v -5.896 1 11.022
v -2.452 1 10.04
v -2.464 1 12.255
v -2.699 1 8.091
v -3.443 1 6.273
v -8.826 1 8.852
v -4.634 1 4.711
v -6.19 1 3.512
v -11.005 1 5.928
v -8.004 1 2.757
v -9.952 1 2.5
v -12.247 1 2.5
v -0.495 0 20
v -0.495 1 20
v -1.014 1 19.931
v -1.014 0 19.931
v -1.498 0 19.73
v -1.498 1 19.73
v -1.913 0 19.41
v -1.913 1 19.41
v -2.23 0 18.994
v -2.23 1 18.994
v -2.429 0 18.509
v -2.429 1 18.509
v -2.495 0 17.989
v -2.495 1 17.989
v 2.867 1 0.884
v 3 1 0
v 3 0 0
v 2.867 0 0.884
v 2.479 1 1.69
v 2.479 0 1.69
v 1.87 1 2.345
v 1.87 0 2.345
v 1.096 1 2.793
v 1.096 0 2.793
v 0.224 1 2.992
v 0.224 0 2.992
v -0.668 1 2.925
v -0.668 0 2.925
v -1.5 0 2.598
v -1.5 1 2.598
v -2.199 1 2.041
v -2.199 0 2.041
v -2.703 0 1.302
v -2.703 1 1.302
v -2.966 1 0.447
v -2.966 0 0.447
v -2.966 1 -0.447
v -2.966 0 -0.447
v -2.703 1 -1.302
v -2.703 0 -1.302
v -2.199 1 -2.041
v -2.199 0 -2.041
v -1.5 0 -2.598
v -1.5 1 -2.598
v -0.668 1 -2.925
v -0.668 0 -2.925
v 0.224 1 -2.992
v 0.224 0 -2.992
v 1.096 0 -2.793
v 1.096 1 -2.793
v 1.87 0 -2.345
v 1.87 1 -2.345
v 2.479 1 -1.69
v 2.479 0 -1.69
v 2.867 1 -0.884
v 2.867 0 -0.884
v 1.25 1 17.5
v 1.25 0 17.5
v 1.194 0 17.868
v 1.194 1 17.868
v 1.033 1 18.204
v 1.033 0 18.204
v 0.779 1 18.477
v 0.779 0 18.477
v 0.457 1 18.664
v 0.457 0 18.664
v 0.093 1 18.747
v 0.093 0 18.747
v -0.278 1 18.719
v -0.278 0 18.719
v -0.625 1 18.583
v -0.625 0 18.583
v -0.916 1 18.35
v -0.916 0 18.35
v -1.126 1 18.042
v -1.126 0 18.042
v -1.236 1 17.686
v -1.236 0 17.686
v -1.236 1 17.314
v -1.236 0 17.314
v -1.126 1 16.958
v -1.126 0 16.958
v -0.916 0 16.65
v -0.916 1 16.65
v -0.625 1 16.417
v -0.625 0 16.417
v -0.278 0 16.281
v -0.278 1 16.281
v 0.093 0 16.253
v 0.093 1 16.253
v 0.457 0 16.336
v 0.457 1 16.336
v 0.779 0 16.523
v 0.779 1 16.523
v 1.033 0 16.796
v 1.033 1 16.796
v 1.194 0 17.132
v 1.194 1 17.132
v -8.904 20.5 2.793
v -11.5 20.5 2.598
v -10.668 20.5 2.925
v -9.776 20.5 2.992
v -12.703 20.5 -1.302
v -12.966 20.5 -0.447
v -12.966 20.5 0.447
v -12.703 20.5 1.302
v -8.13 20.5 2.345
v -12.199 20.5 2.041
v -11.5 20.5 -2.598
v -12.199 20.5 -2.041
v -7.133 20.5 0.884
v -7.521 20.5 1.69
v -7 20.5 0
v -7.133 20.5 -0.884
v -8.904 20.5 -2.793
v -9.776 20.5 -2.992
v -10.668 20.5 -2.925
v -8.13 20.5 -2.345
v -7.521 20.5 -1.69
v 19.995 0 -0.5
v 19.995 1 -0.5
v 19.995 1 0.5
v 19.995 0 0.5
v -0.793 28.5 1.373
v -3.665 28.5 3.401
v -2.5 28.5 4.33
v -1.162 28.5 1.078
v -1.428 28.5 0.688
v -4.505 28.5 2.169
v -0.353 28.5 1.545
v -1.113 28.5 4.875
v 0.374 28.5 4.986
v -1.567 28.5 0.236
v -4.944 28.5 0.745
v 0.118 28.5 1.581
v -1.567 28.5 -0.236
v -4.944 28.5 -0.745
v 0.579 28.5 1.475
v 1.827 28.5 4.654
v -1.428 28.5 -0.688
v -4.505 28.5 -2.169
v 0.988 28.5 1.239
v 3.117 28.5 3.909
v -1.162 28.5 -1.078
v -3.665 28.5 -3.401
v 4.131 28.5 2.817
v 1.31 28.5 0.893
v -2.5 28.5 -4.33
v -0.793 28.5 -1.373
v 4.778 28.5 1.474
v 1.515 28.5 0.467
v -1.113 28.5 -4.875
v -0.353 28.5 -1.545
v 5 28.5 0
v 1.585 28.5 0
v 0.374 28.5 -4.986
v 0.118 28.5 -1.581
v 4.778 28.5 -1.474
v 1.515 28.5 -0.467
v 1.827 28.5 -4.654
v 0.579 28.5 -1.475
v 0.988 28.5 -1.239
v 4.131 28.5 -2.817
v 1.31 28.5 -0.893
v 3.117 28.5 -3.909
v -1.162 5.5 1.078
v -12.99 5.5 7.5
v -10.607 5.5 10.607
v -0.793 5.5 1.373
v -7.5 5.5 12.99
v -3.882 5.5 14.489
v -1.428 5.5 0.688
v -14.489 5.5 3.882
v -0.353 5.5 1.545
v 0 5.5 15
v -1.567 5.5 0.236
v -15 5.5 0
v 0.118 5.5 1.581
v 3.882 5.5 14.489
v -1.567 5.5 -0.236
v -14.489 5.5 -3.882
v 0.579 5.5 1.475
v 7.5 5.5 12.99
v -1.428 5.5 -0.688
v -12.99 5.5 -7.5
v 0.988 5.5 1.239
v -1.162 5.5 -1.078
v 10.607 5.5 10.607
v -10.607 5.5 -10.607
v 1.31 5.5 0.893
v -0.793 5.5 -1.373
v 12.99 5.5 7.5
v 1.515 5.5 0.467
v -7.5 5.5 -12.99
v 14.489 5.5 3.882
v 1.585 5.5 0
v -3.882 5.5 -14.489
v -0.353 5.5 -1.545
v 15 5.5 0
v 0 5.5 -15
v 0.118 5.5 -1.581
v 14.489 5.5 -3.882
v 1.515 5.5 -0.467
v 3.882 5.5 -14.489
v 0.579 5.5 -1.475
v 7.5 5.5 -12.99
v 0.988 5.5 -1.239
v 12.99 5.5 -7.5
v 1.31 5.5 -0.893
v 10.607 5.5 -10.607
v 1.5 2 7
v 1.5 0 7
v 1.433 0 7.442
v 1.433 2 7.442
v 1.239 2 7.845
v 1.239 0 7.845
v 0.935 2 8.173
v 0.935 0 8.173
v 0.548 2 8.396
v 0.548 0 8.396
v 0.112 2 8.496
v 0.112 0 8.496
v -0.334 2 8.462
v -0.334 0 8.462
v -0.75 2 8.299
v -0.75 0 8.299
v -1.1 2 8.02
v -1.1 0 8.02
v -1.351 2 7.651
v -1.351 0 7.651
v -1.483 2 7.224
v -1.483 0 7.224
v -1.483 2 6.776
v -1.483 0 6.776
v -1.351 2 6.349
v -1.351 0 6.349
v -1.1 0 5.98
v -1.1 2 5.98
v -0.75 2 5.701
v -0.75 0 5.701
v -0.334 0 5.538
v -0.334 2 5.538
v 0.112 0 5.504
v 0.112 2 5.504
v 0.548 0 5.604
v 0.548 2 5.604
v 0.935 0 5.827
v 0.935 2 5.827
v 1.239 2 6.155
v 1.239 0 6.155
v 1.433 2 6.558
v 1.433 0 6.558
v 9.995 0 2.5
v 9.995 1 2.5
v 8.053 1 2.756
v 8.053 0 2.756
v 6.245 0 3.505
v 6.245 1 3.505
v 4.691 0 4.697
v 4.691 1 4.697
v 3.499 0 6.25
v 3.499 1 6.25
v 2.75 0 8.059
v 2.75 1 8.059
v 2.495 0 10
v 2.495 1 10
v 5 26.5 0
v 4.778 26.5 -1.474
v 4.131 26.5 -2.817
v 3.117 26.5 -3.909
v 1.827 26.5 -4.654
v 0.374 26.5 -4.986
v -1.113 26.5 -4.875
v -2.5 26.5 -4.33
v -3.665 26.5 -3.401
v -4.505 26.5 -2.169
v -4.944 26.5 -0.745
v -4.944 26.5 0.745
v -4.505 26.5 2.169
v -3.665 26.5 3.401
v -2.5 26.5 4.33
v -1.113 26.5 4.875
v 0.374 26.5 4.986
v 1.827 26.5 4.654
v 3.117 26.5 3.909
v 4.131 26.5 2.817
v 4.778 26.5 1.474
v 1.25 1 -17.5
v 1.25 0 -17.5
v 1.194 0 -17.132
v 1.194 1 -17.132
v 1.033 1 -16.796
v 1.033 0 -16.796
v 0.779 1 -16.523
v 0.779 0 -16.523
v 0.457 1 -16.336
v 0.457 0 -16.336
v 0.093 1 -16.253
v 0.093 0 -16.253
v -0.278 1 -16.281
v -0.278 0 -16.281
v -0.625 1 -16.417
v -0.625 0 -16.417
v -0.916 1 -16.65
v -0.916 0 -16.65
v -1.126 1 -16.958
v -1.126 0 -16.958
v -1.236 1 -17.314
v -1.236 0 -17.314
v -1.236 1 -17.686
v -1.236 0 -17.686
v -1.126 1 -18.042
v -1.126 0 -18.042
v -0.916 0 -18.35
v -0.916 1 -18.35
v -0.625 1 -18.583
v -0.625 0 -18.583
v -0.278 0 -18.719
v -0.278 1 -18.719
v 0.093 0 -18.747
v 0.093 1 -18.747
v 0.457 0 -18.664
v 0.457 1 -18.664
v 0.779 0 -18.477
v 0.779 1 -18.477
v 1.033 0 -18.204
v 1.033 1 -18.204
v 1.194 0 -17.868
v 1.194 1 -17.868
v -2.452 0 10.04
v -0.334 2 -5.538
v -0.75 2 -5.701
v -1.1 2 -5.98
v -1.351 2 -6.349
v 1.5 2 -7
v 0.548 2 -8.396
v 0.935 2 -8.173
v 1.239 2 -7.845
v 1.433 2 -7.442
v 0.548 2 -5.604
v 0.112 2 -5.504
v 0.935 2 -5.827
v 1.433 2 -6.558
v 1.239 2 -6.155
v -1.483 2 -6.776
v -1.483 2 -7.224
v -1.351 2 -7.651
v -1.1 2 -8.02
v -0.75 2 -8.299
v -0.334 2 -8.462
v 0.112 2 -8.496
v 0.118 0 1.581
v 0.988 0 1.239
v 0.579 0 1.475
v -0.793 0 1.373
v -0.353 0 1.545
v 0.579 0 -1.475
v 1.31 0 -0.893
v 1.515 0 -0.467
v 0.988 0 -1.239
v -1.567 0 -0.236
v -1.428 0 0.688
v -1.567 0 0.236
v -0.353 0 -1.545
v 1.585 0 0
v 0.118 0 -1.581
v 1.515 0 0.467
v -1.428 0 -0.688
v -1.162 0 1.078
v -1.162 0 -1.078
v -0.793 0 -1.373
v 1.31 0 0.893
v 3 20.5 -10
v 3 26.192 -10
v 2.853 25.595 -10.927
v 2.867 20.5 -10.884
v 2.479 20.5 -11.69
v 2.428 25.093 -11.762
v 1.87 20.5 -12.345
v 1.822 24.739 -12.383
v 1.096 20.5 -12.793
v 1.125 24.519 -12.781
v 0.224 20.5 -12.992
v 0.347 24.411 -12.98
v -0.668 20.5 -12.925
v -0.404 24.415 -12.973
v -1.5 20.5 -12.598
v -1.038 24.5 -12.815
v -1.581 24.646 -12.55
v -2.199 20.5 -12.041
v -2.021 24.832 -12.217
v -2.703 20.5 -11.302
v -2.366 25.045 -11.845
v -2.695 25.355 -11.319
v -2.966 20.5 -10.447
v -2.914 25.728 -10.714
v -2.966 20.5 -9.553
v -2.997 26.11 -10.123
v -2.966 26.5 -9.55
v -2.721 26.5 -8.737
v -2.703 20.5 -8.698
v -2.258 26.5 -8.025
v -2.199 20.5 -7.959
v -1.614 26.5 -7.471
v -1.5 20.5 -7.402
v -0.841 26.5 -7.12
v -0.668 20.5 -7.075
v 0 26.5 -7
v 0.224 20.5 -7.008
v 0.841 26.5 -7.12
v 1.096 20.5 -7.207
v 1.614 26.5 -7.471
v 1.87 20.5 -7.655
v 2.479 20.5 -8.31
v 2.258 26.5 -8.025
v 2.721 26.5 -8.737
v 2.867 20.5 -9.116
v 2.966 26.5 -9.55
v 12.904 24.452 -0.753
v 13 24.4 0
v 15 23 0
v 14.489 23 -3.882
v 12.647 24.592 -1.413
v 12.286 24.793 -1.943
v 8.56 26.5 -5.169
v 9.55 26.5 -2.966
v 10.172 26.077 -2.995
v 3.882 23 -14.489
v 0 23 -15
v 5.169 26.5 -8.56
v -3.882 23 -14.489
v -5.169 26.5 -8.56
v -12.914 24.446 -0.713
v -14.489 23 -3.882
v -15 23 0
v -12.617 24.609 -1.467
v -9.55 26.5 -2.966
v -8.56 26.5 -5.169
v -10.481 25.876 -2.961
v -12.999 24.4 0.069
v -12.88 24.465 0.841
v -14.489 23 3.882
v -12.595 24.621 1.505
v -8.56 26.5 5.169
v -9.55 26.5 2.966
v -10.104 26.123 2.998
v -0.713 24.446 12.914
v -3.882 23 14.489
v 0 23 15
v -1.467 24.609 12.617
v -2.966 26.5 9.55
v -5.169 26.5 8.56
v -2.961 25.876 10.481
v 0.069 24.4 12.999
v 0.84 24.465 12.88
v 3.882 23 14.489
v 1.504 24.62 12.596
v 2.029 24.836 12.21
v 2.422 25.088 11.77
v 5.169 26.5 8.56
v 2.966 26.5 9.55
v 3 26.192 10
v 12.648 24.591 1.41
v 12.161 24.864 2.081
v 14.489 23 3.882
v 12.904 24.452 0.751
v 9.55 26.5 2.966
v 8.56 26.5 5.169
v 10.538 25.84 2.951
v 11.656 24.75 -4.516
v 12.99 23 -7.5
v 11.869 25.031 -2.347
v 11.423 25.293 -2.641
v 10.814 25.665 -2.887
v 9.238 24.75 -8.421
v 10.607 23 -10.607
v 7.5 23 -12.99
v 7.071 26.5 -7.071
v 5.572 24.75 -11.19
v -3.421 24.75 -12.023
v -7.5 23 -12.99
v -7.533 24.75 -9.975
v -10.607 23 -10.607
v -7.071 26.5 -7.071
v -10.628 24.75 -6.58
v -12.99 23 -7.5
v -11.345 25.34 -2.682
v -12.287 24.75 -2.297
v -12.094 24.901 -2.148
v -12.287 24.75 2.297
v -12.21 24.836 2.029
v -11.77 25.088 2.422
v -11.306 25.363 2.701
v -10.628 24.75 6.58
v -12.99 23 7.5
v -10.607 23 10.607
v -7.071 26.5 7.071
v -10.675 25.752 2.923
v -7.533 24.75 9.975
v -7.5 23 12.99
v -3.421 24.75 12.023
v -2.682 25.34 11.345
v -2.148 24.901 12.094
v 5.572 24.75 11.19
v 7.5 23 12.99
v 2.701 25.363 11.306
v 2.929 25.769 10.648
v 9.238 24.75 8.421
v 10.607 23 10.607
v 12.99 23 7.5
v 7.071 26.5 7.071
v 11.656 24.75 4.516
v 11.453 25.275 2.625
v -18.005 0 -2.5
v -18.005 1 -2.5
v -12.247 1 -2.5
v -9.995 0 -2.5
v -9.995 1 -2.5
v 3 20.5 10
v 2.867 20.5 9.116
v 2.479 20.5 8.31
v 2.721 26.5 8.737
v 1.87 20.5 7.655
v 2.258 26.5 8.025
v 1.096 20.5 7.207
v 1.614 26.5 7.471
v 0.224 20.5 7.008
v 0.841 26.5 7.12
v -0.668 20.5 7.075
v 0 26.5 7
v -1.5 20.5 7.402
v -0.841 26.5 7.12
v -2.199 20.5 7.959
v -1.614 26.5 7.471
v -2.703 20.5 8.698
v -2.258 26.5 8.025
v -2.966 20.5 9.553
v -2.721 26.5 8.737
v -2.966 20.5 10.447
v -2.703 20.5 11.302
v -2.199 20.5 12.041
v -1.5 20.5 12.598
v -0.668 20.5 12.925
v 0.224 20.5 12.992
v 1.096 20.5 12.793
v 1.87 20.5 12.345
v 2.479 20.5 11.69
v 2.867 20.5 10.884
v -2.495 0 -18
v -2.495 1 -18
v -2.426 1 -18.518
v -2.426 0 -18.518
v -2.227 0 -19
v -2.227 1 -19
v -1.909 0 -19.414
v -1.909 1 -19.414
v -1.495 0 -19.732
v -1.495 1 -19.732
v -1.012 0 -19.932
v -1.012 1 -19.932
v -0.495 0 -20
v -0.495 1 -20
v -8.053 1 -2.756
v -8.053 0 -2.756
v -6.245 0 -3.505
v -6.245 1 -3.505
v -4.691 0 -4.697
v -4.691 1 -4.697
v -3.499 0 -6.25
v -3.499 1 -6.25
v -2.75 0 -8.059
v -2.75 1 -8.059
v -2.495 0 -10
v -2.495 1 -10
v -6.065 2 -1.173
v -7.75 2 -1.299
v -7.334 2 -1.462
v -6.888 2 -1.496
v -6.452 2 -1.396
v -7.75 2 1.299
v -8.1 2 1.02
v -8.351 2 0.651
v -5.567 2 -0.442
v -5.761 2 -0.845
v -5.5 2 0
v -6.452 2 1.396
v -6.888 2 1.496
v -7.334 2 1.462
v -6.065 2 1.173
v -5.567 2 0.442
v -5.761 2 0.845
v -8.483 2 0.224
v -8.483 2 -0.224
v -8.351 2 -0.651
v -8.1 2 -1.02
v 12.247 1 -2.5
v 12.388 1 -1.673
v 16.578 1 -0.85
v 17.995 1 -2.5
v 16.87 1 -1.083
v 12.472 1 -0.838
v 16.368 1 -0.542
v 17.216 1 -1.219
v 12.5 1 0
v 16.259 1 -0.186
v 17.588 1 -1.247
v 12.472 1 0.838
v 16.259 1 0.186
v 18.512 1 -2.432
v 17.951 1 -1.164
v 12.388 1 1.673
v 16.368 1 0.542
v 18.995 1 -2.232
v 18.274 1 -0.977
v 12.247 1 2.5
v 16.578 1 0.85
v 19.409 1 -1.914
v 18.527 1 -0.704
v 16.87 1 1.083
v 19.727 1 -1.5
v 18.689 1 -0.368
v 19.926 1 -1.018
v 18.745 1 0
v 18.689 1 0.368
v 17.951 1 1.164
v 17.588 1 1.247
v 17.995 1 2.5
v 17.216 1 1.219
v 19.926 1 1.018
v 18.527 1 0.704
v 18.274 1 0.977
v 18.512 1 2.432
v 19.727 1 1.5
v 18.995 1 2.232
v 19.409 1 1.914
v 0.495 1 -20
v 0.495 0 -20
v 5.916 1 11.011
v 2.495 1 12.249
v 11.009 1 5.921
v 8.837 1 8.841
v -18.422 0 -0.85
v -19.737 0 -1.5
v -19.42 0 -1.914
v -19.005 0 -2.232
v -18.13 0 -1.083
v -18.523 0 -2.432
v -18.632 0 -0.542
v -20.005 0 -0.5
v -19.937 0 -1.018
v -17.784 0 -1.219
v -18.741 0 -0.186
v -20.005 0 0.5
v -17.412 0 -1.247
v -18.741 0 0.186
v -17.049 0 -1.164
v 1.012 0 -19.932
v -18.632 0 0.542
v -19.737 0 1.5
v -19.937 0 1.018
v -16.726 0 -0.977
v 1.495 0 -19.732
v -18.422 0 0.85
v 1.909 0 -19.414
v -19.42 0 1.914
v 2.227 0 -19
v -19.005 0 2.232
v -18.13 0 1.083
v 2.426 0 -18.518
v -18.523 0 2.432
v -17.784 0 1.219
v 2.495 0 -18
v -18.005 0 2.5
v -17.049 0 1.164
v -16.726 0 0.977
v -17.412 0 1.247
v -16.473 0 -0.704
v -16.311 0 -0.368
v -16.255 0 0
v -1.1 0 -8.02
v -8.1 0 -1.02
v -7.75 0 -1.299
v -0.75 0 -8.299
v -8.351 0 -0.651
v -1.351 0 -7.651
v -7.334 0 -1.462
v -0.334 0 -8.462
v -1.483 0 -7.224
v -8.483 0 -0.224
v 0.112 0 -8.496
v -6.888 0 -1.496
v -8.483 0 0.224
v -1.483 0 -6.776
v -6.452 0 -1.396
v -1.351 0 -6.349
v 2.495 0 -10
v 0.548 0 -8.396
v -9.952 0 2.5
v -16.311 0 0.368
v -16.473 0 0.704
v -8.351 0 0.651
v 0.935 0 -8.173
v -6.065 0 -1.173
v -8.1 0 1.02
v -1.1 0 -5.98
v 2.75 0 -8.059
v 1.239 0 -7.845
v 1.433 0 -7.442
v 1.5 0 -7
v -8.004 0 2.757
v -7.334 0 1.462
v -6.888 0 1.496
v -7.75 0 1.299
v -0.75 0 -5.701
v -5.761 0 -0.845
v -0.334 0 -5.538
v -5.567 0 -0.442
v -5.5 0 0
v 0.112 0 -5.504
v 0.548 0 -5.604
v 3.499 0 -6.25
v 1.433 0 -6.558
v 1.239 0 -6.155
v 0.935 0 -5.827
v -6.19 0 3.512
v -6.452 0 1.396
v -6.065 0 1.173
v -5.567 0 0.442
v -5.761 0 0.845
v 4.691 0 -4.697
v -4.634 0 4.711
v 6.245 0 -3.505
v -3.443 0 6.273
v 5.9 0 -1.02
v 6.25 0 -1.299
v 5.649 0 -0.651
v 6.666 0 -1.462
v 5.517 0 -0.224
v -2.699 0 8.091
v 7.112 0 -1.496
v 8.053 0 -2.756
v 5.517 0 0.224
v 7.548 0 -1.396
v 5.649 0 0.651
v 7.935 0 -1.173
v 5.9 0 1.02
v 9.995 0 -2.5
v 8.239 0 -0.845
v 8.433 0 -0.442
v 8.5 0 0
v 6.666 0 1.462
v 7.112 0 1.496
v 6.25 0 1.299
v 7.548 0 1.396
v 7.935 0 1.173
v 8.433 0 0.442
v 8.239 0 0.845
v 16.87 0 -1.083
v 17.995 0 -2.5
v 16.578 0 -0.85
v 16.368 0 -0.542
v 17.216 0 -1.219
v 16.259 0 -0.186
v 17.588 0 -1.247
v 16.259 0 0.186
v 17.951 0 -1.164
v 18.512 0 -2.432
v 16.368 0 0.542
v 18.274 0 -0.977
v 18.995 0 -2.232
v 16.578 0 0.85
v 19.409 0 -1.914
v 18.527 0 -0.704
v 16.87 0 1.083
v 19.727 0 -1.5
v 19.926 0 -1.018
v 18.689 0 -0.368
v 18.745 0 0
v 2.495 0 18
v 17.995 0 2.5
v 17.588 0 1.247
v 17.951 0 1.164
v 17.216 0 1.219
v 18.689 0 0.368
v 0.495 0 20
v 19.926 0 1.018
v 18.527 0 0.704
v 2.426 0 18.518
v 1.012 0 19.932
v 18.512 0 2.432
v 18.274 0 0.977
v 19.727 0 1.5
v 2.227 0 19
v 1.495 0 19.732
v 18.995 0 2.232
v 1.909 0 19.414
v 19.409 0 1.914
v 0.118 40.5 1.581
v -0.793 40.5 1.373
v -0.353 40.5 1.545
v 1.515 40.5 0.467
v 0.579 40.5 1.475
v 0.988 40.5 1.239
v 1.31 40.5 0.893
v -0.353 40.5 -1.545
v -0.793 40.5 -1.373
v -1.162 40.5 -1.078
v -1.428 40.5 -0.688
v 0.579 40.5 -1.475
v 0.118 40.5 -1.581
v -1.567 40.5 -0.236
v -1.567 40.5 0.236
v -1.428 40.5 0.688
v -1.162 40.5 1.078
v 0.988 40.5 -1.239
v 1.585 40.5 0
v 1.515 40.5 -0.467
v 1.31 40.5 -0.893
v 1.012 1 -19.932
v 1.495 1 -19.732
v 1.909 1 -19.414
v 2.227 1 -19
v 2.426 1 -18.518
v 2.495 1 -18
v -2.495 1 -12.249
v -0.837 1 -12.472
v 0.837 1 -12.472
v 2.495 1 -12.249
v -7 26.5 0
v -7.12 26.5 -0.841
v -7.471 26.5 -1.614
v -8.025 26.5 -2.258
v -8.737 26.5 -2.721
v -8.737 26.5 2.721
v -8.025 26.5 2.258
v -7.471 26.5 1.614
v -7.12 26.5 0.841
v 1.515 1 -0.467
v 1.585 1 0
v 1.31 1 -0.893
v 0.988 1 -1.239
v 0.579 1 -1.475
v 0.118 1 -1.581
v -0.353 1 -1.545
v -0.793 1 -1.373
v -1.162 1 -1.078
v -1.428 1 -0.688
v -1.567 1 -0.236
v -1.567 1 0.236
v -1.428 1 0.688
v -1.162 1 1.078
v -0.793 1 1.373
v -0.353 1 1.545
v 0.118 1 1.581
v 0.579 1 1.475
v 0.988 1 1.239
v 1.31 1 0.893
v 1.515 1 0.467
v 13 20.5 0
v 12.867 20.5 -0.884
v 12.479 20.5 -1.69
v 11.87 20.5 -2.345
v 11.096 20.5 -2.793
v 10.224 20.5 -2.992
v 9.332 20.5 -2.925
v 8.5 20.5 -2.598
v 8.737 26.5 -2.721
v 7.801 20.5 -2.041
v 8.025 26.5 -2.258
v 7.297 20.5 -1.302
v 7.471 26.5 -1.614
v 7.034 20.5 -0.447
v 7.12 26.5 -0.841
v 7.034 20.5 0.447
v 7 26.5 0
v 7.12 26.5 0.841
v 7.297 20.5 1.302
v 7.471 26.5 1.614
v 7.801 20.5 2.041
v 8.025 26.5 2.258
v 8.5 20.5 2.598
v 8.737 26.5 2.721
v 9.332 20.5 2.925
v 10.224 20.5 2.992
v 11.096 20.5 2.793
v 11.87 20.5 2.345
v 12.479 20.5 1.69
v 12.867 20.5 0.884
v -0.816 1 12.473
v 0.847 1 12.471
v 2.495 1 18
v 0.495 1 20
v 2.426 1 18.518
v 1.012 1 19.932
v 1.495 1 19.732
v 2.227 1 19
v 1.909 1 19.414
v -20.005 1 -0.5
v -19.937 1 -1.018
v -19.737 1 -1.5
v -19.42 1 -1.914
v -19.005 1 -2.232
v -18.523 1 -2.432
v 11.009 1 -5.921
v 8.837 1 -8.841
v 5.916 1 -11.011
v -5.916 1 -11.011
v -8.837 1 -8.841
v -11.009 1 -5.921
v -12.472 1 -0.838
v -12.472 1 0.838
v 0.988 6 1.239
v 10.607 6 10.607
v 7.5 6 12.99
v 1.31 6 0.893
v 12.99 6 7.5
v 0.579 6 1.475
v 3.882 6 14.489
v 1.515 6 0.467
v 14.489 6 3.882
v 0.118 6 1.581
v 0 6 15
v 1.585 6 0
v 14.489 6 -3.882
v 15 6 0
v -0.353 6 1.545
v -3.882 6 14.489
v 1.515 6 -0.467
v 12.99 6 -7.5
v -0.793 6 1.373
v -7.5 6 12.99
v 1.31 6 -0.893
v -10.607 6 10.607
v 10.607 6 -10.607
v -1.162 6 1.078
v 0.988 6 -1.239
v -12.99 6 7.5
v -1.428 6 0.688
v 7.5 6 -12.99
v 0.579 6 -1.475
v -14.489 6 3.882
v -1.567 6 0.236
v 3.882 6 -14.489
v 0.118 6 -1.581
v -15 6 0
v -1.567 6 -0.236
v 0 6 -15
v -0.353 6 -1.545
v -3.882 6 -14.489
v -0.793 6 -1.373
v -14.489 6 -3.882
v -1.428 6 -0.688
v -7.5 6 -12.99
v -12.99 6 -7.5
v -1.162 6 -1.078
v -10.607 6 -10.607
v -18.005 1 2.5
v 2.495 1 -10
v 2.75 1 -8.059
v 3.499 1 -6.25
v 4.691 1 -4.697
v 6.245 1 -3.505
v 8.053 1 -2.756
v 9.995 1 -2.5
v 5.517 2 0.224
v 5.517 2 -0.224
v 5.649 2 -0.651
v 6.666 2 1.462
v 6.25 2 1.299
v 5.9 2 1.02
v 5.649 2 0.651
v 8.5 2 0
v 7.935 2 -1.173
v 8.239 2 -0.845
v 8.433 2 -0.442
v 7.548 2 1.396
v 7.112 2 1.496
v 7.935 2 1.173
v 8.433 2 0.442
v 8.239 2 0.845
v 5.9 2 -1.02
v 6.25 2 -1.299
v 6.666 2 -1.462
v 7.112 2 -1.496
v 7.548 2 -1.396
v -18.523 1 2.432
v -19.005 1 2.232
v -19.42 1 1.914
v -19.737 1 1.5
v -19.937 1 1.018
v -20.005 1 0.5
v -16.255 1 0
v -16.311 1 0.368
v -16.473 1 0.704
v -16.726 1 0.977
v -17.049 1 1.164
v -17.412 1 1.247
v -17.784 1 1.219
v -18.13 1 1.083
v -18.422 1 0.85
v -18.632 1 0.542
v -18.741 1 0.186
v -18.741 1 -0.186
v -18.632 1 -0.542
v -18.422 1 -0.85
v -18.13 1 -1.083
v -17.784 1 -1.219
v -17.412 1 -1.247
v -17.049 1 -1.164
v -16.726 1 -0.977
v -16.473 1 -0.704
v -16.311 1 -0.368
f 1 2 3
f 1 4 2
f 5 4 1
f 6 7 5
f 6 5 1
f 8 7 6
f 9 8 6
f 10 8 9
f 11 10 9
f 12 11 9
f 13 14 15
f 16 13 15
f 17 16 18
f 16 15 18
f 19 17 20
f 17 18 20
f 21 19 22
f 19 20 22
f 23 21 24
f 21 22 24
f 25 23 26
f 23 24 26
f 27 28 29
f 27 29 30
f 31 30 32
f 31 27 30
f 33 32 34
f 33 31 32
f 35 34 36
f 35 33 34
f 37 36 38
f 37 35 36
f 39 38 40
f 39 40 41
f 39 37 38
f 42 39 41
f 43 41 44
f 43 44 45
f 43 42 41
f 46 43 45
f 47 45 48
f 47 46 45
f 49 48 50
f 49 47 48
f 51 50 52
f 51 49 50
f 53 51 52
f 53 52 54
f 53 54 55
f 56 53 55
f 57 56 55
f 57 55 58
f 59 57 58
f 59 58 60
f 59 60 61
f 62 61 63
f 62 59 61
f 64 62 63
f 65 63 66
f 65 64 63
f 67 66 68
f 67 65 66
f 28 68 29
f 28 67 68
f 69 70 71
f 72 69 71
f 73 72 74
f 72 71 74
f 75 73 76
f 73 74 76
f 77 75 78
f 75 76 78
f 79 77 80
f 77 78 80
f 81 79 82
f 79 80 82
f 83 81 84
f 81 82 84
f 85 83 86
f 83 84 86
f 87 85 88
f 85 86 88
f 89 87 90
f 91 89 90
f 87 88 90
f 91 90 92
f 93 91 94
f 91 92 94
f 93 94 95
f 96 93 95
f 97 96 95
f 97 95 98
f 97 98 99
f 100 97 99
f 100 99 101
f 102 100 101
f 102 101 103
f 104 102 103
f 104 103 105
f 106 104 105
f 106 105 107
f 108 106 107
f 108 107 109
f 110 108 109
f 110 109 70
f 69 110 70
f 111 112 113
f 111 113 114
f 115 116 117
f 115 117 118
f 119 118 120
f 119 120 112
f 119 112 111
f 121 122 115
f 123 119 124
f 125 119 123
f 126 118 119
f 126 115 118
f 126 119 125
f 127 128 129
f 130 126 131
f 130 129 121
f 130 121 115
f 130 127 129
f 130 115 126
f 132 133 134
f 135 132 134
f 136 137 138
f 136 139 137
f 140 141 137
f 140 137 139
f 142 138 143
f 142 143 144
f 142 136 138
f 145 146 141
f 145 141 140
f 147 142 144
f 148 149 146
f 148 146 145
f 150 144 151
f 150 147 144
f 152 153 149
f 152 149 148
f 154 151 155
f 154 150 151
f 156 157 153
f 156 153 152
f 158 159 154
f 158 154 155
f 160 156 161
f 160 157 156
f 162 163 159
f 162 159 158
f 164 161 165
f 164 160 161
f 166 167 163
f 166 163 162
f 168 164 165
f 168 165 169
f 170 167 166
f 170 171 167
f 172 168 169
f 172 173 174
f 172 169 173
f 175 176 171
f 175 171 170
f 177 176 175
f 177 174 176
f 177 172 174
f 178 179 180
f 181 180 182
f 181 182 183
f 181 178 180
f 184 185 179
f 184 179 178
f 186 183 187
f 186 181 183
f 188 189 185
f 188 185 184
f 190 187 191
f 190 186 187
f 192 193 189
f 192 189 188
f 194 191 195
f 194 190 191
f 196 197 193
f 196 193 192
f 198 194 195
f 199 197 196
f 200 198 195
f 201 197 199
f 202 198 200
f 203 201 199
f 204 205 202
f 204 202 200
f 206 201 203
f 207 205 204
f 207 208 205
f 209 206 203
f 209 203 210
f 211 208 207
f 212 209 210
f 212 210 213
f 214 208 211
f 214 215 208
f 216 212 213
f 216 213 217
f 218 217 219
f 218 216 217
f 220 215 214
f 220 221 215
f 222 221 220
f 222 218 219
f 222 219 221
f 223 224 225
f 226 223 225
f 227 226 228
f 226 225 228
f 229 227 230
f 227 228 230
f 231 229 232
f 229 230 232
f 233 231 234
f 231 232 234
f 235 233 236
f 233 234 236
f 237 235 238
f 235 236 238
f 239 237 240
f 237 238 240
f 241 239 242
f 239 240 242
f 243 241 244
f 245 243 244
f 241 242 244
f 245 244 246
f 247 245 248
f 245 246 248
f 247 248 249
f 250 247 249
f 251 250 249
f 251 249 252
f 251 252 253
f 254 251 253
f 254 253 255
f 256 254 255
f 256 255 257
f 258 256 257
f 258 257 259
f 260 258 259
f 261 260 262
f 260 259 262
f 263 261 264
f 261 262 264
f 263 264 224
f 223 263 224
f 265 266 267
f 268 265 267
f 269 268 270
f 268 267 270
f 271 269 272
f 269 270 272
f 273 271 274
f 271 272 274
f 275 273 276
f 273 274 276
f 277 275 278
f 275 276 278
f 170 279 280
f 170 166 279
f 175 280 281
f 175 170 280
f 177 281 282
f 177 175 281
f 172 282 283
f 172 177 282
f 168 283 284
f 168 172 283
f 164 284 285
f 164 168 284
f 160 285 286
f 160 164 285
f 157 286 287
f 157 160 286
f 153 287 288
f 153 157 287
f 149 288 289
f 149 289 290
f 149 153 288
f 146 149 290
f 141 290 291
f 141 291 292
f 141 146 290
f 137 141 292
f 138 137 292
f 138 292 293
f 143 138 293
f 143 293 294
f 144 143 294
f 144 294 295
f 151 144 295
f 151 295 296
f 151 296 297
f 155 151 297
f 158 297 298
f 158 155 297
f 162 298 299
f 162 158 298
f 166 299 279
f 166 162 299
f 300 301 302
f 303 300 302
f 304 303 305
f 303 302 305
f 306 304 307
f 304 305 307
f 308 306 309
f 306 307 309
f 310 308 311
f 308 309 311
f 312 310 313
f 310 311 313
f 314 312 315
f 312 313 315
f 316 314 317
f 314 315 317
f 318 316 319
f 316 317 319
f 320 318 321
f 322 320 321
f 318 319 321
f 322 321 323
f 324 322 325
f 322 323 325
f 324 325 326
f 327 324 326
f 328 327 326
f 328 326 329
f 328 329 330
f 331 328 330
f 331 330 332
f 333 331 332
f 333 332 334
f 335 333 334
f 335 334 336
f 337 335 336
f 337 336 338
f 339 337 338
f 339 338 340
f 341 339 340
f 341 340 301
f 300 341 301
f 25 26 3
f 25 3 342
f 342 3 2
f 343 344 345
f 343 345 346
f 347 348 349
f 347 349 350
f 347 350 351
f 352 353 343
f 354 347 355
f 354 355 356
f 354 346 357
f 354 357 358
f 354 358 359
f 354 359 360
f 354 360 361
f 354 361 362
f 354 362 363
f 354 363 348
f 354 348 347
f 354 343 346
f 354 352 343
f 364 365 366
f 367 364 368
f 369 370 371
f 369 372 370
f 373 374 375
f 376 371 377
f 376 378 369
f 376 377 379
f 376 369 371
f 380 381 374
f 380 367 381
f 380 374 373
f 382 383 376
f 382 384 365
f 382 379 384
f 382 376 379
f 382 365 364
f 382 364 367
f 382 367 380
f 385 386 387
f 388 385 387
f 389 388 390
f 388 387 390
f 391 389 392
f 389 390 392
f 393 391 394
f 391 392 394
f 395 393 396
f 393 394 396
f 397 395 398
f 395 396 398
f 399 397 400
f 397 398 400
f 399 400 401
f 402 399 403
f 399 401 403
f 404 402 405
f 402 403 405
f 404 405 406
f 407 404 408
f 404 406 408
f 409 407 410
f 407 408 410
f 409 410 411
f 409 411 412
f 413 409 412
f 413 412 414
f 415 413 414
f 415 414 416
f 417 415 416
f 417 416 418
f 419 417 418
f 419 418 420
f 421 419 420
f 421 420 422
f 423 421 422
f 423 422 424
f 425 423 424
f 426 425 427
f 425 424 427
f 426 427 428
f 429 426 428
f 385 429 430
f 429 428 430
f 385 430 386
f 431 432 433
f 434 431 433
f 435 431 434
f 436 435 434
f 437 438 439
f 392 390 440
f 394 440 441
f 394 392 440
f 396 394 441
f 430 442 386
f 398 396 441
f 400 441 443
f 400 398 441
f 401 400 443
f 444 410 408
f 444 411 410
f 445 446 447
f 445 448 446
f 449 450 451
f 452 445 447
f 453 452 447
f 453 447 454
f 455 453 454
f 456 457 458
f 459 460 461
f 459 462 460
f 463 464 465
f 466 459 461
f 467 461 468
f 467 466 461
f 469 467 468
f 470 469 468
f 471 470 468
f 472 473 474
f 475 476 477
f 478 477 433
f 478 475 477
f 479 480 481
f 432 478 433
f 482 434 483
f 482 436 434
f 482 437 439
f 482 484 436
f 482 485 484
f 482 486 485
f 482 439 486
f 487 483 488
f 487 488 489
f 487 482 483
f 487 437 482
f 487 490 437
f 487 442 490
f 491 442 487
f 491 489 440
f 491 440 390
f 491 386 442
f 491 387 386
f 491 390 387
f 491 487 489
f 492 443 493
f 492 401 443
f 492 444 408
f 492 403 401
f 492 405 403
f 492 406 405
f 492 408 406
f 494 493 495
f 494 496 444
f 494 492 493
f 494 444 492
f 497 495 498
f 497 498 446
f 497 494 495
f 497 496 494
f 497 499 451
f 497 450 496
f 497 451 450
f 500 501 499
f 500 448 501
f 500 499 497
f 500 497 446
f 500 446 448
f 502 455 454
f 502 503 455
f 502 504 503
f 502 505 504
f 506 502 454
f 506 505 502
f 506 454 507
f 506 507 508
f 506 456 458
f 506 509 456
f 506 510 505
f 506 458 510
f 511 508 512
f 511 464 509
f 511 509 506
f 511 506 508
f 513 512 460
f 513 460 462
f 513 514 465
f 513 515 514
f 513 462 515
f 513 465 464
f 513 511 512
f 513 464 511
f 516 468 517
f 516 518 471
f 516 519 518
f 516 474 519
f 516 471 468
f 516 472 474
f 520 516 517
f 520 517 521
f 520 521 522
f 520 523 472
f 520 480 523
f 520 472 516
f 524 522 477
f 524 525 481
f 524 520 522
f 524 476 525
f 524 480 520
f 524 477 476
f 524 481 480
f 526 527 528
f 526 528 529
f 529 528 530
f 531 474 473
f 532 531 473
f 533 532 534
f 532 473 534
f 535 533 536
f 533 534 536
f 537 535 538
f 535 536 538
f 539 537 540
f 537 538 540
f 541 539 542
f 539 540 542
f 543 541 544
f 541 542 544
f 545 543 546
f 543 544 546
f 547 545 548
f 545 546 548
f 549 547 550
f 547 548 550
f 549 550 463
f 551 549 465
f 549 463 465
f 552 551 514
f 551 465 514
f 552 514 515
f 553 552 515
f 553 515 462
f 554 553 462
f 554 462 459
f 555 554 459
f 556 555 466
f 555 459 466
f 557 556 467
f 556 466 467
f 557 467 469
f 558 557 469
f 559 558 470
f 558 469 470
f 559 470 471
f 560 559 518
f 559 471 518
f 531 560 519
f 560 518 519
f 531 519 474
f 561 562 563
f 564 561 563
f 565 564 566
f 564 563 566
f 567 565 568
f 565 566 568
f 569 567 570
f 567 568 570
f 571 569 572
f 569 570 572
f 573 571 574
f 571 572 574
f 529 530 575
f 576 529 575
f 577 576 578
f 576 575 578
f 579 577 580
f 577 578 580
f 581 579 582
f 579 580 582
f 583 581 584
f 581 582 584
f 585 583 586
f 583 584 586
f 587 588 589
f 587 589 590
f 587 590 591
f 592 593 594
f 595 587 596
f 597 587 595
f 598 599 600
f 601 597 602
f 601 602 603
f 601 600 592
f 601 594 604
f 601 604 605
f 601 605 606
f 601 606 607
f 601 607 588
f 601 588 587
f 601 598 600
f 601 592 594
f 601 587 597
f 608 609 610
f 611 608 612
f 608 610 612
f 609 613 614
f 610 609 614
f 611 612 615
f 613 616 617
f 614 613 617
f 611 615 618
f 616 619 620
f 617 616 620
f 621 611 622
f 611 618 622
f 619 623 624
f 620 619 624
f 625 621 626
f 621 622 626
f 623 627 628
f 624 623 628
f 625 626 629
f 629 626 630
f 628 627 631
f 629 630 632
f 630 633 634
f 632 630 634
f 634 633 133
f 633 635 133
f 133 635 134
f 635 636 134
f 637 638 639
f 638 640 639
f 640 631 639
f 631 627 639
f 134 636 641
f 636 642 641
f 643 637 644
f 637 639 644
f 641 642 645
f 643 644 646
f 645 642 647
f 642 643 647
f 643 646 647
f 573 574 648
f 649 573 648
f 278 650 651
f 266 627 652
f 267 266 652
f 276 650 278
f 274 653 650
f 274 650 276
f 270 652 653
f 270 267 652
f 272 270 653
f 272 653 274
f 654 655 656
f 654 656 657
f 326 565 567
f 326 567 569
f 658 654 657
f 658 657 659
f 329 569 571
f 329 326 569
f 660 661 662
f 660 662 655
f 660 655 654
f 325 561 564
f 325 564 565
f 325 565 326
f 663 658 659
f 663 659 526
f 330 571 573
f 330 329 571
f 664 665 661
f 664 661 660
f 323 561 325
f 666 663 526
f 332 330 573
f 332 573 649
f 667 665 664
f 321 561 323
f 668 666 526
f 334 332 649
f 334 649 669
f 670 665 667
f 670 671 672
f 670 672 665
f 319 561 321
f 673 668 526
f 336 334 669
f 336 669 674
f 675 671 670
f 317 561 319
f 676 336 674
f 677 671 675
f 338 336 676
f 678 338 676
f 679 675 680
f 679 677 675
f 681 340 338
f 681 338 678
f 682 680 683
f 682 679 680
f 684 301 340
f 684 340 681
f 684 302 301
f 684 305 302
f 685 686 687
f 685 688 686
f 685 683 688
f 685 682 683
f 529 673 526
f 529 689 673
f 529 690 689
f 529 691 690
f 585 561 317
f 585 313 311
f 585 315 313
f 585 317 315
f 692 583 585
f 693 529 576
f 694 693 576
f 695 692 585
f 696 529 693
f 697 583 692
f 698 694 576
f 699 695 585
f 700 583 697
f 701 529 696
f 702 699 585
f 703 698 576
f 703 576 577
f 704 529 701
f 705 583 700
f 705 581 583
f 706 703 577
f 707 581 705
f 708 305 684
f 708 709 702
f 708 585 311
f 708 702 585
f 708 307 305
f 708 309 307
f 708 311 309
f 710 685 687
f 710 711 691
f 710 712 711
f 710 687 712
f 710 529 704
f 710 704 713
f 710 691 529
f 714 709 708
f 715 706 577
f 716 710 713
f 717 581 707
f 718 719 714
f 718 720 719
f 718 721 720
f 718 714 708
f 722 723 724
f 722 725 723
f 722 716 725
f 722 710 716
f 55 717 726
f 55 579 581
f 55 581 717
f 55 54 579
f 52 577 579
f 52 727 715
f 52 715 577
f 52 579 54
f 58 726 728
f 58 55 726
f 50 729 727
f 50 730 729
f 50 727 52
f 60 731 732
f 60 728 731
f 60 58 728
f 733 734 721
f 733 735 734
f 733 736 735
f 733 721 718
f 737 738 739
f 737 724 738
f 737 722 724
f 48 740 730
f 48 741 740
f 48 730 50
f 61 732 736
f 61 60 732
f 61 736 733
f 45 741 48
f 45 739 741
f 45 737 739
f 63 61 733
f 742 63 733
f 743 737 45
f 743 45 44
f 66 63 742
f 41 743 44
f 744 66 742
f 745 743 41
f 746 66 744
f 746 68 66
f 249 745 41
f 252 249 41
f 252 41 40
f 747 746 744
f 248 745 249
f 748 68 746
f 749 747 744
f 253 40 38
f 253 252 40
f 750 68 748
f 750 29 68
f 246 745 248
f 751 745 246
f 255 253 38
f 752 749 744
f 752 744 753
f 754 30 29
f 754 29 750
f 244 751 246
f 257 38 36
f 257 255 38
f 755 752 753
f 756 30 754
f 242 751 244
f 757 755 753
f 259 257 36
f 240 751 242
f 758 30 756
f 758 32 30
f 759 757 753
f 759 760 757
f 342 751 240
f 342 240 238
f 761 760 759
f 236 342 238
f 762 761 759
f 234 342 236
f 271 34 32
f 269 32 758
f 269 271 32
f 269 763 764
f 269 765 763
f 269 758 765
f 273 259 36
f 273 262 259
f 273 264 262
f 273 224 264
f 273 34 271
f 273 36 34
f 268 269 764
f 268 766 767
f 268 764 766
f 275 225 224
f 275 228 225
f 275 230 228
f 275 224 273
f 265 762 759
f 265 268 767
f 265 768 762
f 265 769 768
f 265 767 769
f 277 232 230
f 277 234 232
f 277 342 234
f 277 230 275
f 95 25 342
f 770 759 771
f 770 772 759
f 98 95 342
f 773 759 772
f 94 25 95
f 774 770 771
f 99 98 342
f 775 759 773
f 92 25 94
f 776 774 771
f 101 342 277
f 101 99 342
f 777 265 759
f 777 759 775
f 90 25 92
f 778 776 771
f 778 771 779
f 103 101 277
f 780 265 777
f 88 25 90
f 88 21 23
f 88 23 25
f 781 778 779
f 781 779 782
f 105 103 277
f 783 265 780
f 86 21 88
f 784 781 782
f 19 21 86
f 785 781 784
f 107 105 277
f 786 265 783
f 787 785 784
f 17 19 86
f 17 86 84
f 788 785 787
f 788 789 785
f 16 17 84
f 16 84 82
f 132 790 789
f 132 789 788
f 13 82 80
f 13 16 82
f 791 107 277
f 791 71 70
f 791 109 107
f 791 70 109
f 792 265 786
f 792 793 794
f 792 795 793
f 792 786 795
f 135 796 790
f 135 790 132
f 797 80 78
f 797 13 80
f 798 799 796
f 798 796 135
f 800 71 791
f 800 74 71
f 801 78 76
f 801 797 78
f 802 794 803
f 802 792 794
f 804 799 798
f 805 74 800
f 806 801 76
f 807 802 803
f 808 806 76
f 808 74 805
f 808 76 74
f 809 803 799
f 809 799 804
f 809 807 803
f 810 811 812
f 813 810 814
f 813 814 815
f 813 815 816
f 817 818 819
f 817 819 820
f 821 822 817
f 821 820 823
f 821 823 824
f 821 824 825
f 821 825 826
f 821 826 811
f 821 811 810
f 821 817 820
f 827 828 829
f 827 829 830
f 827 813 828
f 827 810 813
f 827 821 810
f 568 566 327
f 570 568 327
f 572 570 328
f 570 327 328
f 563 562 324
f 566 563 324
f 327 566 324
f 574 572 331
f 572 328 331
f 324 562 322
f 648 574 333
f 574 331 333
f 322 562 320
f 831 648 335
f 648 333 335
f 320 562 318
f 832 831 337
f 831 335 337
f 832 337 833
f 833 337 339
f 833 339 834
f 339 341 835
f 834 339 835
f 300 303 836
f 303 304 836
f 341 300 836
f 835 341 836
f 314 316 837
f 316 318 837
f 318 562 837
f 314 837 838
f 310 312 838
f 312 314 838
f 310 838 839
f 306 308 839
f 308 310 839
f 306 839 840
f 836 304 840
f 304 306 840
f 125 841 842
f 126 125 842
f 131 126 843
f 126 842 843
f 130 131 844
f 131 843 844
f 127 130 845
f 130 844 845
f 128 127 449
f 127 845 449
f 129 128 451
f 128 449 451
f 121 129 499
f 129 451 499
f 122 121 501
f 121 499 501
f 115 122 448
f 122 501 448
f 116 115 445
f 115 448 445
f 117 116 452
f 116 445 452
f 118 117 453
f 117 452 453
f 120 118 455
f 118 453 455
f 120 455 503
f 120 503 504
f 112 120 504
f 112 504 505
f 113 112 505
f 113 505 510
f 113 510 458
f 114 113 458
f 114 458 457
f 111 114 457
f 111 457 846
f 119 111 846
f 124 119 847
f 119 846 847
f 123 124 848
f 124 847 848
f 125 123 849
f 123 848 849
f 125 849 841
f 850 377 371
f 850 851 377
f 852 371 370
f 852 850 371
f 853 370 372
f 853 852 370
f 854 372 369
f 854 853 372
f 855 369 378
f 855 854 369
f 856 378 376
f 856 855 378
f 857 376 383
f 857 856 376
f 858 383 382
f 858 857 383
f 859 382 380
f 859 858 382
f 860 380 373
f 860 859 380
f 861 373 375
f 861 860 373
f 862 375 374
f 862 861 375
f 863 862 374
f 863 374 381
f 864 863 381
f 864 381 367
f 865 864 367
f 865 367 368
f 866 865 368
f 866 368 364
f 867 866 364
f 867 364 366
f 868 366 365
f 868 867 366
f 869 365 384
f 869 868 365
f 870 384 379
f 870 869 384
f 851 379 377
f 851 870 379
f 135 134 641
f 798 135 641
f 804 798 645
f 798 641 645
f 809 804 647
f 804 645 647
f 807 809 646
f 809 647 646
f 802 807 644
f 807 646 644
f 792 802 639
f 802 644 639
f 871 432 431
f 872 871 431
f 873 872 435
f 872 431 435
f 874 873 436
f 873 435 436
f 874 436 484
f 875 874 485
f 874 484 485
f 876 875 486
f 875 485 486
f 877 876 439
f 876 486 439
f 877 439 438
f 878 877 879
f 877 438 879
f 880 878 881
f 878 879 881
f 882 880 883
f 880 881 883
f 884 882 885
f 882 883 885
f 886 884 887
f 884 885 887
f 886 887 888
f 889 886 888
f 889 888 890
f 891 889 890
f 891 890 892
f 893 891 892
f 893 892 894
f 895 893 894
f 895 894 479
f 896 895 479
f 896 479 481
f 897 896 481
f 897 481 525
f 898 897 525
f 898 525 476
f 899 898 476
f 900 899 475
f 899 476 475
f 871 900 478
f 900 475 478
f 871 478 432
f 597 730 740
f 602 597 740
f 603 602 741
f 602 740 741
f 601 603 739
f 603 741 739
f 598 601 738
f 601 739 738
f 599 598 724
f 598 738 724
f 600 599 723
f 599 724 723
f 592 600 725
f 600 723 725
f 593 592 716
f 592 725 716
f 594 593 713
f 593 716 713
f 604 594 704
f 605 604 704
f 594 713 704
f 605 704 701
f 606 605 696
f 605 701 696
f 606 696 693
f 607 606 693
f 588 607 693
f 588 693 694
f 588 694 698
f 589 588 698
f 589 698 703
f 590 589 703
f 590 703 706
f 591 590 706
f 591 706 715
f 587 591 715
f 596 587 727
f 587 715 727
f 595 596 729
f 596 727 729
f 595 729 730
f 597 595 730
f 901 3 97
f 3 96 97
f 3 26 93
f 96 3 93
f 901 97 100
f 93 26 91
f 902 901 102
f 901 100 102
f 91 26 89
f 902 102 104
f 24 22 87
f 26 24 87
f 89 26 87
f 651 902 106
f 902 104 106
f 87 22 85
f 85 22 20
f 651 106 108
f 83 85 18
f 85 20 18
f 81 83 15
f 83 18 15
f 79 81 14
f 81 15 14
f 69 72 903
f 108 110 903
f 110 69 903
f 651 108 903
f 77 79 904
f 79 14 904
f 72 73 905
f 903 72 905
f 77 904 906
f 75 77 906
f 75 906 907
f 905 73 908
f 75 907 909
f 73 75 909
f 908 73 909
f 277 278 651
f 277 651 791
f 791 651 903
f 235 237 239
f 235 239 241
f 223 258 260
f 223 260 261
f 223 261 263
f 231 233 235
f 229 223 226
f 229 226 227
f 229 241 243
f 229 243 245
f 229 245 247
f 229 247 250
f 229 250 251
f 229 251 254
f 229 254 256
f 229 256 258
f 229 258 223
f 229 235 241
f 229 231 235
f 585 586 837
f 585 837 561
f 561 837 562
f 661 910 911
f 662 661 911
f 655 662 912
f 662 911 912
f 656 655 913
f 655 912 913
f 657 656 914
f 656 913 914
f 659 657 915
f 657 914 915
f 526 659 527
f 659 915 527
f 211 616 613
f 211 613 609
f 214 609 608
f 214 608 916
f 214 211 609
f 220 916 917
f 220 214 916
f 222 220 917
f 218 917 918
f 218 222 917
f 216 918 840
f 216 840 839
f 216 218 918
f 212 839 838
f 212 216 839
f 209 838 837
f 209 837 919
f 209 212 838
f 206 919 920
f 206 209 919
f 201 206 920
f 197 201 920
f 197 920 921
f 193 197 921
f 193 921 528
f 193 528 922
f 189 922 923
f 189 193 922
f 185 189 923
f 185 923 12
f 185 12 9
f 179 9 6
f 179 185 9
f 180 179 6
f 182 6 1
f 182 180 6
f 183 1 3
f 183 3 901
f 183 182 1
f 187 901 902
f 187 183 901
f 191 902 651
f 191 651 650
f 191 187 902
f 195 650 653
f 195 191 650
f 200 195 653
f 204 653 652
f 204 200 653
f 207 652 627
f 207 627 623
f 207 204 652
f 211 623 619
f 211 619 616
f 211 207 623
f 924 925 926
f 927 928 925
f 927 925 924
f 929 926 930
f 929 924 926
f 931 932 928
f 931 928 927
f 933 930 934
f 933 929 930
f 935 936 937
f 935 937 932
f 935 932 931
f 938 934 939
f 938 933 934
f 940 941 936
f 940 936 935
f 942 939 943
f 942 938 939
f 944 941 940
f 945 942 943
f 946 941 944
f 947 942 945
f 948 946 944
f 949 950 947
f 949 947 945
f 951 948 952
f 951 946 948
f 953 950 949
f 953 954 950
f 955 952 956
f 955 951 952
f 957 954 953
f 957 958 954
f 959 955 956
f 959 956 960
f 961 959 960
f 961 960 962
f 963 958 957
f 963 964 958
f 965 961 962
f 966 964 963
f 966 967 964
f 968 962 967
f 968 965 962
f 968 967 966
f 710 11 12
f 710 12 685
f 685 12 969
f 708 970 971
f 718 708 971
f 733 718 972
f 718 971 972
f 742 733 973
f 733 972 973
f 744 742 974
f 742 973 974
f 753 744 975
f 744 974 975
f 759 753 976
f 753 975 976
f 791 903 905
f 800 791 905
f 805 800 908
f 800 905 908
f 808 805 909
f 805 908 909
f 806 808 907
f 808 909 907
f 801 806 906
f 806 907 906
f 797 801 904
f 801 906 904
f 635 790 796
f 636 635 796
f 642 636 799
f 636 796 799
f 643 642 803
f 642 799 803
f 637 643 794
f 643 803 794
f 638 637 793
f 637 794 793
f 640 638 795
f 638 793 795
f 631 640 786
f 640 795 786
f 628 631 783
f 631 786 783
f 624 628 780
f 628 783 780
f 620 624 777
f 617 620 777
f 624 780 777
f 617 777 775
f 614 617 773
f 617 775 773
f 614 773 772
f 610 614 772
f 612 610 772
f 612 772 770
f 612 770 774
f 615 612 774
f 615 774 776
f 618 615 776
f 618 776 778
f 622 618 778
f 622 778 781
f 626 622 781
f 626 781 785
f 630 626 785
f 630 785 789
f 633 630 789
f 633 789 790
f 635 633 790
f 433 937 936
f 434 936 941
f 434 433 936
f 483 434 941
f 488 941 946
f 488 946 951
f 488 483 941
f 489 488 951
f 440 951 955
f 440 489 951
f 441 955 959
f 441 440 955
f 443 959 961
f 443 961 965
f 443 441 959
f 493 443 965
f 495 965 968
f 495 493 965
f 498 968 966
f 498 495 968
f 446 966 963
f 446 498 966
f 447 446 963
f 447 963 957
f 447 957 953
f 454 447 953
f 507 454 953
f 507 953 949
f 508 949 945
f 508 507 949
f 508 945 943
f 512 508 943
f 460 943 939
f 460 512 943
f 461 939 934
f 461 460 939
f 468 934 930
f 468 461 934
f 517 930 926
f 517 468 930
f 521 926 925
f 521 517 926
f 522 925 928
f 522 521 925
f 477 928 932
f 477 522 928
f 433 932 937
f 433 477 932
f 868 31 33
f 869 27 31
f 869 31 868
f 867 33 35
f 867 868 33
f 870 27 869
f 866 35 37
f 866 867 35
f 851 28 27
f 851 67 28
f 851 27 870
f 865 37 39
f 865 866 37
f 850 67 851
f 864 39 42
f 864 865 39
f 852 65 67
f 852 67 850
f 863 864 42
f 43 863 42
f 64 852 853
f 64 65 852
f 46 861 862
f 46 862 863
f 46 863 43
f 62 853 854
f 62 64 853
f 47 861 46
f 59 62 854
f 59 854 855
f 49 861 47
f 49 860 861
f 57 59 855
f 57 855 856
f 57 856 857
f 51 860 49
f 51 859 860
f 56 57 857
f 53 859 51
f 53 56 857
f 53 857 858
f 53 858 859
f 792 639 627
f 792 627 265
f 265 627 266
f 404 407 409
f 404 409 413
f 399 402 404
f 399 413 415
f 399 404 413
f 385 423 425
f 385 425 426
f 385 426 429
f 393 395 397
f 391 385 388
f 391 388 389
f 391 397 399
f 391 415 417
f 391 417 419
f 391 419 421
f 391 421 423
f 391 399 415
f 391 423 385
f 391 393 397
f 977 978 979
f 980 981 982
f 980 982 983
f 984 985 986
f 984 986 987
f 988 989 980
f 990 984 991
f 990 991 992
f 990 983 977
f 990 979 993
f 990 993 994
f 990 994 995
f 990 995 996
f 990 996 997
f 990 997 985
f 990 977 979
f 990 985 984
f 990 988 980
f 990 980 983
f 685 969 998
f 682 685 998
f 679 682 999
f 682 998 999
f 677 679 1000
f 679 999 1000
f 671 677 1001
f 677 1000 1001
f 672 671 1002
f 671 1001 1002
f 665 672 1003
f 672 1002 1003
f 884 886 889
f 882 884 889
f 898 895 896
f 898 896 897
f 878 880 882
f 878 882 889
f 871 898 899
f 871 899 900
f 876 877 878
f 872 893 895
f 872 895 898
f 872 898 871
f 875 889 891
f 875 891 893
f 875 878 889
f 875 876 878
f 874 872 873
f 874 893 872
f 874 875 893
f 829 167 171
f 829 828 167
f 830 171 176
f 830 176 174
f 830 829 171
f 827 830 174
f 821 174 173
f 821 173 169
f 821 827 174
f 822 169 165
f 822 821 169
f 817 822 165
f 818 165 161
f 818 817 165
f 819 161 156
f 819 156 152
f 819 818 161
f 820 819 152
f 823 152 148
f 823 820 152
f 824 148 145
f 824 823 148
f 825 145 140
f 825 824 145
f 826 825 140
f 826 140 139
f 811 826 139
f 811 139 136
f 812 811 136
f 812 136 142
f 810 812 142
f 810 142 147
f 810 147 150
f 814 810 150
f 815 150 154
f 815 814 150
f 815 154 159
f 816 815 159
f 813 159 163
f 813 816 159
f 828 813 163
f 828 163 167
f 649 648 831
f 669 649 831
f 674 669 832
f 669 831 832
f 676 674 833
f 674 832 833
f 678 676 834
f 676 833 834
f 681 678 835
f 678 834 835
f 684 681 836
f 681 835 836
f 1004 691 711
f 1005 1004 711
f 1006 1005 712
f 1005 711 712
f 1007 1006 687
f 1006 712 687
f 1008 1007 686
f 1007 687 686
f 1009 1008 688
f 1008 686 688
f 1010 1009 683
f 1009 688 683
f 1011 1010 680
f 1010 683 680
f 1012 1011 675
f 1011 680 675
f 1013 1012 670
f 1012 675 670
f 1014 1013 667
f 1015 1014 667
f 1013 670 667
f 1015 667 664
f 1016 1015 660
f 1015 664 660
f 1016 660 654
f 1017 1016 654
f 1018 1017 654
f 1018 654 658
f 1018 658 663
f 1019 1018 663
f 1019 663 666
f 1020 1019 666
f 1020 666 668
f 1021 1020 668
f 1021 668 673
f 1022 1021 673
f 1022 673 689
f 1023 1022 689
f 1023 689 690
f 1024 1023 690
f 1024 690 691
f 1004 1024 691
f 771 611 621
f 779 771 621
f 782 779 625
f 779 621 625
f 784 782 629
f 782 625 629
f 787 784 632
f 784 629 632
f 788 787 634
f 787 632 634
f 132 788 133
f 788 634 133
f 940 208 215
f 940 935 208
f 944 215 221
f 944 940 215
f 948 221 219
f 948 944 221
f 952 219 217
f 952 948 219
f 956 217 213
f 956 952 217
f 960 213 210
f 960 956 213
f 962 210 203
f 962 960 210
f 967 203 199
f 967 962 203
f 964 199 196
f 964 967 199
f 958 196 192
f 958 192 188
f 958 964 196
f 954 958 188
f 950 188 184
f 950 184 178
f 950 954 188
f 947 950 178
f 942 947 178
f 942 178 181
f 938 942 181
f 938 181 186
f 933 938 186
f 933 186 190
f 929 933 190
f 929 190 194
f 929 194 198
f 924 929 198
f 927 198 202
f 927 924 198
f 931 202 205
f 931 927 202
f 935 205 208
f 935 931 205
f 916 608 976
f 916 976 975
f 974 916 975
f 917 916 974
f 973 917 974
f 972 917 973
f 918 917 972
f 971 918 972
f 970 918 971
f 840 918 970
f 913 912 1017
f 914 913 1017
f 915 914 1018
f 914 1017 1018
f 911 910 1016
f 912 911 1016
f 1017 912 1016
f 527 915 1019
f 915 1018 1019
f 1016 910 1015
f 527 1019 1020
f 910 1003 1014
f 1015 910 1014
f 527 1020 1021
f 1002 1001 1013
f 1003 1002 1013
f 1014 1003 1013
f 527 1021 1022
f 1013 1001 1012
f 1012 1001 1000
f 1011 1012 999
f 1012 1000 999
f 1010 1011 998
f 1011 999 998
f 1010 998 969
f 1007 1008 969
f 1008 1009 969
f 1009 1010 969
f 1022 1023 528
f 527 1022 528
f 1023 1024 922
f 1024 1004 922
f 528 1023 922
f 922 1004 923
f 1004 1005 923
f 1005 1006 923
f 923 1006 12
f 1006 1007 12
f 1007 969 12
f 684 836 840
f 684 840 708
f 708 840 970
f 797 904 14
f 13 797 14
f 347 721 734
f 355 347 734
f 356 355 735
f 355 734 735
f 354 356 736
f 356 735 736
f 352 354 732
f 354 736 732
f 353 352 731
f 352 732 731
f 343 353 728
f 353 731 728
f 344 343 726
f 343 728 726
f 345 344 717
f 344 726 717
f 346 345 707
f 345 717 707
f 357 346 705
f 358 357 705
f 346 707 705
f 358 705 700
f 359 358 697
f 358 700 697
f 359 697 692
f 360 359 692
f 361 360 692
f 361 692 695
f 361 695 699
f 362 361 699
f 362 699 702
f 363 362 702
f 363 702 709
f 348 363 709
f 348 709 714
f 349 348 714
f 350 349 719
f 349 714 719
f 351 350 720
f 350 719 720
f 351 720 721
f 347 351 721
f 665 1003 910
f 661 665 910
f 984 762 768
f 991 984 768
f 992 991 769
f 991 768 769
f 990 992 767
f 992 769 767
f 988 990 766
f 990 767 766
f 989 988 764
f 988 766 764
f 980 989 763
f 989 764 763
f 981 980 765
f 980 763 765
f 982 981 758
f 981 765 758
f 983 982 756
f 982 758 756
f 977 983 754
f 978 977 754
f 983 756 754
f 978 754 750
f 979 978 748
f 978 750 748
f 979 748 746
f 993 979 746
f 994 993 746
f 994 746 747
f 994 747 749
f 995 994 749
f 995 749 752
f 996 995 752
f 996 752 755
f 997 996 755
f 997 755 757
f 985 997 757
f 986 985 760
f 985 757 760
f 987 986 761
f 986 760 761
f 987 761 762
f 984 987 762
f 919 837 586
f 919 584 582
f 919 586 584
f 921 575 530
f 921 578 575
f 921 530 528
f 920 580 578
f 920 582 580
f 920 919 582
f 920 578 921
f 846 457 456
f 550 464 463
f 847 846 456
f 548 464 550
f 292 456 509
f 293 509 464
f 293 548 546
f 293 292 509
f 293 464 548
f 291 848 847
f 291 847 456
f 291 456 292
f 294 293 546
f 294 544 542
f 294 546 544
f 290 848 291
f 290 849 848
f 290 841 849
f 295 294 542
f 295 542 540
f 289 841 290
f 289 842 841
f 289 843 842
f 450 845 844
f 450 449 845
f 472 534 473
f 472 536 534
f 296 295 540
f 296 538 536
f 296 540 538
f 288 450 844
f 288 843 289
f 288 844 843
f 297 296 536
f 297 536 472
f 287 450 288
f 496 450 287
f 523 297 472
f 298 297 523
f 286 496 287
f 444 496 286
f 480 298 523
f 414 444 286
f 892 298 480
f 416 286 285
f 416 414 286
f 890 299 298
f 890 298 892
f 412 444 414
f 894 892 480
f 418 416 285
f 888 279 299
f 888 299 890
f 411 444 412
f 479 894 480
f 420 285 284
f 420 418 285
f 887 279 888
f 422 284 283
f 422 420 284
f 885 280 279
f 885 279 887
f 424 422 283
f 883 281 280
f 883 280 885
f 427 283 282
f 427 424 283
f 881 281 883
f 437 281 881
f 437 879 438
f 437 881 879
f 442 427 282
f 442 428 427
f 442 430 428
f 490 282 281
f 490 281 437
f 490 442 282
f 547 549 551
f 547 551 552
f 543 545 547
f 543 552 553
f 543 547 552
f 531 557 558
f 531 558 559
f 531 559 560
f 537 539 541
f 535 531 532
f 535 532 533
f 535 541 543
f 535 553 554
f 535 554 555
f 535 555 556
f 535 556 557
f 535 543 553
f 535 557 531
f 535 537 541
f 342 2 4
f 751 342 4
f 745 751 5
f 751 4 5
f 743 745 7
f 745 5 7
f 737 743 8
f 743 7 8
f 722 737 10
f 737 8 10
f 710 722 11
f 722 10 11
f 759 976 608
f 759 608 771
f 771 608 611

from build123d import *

# Parameters (mm, degrees)
SKETCH4_R                  = 3
MOTOR_COOLING_SYSTEM_DEPTH = 6
SKETCH6_R                  = 3
MOTOR_BASE_HOLDER_DEPTH    = 1
SKETCH9_R                  = 1.25
SKETCH9_R_2                = 1.5
SCREWS_CUT_DEPTH           = 2


with BuildPart() as part:
    # Sketch1 → Electric motor body (revolve)
    with BuildSketch(Plane.XY):
        Polygon((0, 0), (1.585, 0), (1.585, 1), (12.5, 1), (15, 5.5), (1.585, 5.5), (1.585, 6), (15, 6), (15, 23), (10, 26.5), (5, 26.5), (5, 28.5), (1.585, 28.5), (1.585, 40.5), (0, 40.5), align=None)
    revolve(axis=Axis((0, 0, 0), (0, 1, 0)))

    # Sketch4 → motor cooling system (cut)
    with BuildSketch(Plane(origin=(0, 26.5, 0), x_dir=(1, 0, 0), z_dir=(0, 1, 0))):
        with Locations((0, -10)):
            Circle(SKETCH4_R)
        with Locations((-10, 0)):
            Circle(SKETCH4_R)
        with Locations((10, 0)):
            Circle(SKETCH4_R)
        with Locations((0, 10)):
            Circle(SKETCH4_R)
    extrude(amount=-MOTOR_COOLING_SYSTEM_DEPTH, mode=Mode.SUBTRACT)

    # Sketch6 → Motor base holder (add)
    with BuildSketch(Plane.XZ.offset(-1)):
        with BuildLine():
            Line((19.994606566, -0.5), (19.994606566, 0.5))
            ThreePointArc((19.994606566, 0.5), (19.408820128, 1.914213562), (17.994606566, 2.5))
            Line((17.994606566, 2.5), (9.994606566, 2.5))
            ThreePointArc((9.994606566, 2.5), (4.691305707, 4.696699141), (2.494606566, 10))
            Line((2.494606566, 10), (2.494606566, 18))
            ThreePointArc((2.494606566, 18), (1.908820128, 19.414213562), (0.494606566, 20))
            Line((0.494606566, 20), (-0.494606566, 20))
            ThreePointArc((-0.494606566, 20), (-1.912618477, 19.410404985), (-2.494577633, 17.989242221))
            Line((-2.494577633, 17.989242221), (-2.451820757, 10.040341672))
            ThreePointArc((-2.451820757, 10.040341672), (-4.634167594, 4.710981307), (-9.951712259, 2.5))
            Line((-9.951712259, 2.5), (-18.005393434, 2.5))
            ThreePointArc((-18.005393434, 2.5), (-19.419606996, 1.914213562), (-20.005393434, 0.5))
            Line((-20.005393434, 0.5), (-20.005393434, -0.5))
            ThreePointArc((-20.005393434, -0.5), (-19.419606996, -1.914213562), (-18.005393434, -2.5))
            Line((-18.005393434, -2.5), (-9.994606566, -2.5))
            ThreePointArc((-9.994606566, -2.5), (-4.691305707, -4.696699141), (-2.494606566, -10))
            Line((-2.494606566, -10), (-2.494606566, -18))
            ThreePointArc((-2.494606566, -18), (-1.908820128, -19.414213562), (-0.494606566, -20))
            Line((-0.494606566, -20), (0.494606566, -20))
            ThreePointArc((0.494606566, -20), (1.908820128, -19.414213562), (2.494606566, -18))
            Line((2.494606566, -18), (2.494606566, -10))
            ThreePointArc((2.494606566, -10), (4.691305707, -4.696699141), (9.994606566, -2.5))
            Line((9.994606566, -2.5), (17.994606566, -2.5))
            ThreePointArc((17.994606566, -2.5), (19.408820128, -1.914213562), (19.994606566, -0.5))
        make_face()
        Circle(SKETCH6_R, mode=Mode.SUBTRACT)
    extrude(amount=MOTOR_BASE_HOLDER_DEPTH)

    # Sketch9 → Screws cut (cut)
    with BuildSketch(Plane.XZ):
        with Locations((-17.505393434, 0)):
            Circle(SKETCH9_R)
        with Locations((17.494606566, 0)):
            Circle(SKETCH9_R)
        with Locations((0, -17.5)):
            Circle(SKETCH9_R)
        with Locations((0, 17.5)):
            Circle(SKETCH9_R)
        with Locations((7, 0)):
            Circle(SKETCH9_R_2)
        with Locations((0, -7)):
            Circle(SKETCH9_R_2)
        with Locations((-7, 0)):
            Circle(SKETCH9_R_2)
        with Locations((0, 7)):
            Circle(SKETCH9_R_2)
    extrude(amount=-SCREWS_CUT_DEPTH, mode=Mode.SUBTRACT)


solid = part.part
